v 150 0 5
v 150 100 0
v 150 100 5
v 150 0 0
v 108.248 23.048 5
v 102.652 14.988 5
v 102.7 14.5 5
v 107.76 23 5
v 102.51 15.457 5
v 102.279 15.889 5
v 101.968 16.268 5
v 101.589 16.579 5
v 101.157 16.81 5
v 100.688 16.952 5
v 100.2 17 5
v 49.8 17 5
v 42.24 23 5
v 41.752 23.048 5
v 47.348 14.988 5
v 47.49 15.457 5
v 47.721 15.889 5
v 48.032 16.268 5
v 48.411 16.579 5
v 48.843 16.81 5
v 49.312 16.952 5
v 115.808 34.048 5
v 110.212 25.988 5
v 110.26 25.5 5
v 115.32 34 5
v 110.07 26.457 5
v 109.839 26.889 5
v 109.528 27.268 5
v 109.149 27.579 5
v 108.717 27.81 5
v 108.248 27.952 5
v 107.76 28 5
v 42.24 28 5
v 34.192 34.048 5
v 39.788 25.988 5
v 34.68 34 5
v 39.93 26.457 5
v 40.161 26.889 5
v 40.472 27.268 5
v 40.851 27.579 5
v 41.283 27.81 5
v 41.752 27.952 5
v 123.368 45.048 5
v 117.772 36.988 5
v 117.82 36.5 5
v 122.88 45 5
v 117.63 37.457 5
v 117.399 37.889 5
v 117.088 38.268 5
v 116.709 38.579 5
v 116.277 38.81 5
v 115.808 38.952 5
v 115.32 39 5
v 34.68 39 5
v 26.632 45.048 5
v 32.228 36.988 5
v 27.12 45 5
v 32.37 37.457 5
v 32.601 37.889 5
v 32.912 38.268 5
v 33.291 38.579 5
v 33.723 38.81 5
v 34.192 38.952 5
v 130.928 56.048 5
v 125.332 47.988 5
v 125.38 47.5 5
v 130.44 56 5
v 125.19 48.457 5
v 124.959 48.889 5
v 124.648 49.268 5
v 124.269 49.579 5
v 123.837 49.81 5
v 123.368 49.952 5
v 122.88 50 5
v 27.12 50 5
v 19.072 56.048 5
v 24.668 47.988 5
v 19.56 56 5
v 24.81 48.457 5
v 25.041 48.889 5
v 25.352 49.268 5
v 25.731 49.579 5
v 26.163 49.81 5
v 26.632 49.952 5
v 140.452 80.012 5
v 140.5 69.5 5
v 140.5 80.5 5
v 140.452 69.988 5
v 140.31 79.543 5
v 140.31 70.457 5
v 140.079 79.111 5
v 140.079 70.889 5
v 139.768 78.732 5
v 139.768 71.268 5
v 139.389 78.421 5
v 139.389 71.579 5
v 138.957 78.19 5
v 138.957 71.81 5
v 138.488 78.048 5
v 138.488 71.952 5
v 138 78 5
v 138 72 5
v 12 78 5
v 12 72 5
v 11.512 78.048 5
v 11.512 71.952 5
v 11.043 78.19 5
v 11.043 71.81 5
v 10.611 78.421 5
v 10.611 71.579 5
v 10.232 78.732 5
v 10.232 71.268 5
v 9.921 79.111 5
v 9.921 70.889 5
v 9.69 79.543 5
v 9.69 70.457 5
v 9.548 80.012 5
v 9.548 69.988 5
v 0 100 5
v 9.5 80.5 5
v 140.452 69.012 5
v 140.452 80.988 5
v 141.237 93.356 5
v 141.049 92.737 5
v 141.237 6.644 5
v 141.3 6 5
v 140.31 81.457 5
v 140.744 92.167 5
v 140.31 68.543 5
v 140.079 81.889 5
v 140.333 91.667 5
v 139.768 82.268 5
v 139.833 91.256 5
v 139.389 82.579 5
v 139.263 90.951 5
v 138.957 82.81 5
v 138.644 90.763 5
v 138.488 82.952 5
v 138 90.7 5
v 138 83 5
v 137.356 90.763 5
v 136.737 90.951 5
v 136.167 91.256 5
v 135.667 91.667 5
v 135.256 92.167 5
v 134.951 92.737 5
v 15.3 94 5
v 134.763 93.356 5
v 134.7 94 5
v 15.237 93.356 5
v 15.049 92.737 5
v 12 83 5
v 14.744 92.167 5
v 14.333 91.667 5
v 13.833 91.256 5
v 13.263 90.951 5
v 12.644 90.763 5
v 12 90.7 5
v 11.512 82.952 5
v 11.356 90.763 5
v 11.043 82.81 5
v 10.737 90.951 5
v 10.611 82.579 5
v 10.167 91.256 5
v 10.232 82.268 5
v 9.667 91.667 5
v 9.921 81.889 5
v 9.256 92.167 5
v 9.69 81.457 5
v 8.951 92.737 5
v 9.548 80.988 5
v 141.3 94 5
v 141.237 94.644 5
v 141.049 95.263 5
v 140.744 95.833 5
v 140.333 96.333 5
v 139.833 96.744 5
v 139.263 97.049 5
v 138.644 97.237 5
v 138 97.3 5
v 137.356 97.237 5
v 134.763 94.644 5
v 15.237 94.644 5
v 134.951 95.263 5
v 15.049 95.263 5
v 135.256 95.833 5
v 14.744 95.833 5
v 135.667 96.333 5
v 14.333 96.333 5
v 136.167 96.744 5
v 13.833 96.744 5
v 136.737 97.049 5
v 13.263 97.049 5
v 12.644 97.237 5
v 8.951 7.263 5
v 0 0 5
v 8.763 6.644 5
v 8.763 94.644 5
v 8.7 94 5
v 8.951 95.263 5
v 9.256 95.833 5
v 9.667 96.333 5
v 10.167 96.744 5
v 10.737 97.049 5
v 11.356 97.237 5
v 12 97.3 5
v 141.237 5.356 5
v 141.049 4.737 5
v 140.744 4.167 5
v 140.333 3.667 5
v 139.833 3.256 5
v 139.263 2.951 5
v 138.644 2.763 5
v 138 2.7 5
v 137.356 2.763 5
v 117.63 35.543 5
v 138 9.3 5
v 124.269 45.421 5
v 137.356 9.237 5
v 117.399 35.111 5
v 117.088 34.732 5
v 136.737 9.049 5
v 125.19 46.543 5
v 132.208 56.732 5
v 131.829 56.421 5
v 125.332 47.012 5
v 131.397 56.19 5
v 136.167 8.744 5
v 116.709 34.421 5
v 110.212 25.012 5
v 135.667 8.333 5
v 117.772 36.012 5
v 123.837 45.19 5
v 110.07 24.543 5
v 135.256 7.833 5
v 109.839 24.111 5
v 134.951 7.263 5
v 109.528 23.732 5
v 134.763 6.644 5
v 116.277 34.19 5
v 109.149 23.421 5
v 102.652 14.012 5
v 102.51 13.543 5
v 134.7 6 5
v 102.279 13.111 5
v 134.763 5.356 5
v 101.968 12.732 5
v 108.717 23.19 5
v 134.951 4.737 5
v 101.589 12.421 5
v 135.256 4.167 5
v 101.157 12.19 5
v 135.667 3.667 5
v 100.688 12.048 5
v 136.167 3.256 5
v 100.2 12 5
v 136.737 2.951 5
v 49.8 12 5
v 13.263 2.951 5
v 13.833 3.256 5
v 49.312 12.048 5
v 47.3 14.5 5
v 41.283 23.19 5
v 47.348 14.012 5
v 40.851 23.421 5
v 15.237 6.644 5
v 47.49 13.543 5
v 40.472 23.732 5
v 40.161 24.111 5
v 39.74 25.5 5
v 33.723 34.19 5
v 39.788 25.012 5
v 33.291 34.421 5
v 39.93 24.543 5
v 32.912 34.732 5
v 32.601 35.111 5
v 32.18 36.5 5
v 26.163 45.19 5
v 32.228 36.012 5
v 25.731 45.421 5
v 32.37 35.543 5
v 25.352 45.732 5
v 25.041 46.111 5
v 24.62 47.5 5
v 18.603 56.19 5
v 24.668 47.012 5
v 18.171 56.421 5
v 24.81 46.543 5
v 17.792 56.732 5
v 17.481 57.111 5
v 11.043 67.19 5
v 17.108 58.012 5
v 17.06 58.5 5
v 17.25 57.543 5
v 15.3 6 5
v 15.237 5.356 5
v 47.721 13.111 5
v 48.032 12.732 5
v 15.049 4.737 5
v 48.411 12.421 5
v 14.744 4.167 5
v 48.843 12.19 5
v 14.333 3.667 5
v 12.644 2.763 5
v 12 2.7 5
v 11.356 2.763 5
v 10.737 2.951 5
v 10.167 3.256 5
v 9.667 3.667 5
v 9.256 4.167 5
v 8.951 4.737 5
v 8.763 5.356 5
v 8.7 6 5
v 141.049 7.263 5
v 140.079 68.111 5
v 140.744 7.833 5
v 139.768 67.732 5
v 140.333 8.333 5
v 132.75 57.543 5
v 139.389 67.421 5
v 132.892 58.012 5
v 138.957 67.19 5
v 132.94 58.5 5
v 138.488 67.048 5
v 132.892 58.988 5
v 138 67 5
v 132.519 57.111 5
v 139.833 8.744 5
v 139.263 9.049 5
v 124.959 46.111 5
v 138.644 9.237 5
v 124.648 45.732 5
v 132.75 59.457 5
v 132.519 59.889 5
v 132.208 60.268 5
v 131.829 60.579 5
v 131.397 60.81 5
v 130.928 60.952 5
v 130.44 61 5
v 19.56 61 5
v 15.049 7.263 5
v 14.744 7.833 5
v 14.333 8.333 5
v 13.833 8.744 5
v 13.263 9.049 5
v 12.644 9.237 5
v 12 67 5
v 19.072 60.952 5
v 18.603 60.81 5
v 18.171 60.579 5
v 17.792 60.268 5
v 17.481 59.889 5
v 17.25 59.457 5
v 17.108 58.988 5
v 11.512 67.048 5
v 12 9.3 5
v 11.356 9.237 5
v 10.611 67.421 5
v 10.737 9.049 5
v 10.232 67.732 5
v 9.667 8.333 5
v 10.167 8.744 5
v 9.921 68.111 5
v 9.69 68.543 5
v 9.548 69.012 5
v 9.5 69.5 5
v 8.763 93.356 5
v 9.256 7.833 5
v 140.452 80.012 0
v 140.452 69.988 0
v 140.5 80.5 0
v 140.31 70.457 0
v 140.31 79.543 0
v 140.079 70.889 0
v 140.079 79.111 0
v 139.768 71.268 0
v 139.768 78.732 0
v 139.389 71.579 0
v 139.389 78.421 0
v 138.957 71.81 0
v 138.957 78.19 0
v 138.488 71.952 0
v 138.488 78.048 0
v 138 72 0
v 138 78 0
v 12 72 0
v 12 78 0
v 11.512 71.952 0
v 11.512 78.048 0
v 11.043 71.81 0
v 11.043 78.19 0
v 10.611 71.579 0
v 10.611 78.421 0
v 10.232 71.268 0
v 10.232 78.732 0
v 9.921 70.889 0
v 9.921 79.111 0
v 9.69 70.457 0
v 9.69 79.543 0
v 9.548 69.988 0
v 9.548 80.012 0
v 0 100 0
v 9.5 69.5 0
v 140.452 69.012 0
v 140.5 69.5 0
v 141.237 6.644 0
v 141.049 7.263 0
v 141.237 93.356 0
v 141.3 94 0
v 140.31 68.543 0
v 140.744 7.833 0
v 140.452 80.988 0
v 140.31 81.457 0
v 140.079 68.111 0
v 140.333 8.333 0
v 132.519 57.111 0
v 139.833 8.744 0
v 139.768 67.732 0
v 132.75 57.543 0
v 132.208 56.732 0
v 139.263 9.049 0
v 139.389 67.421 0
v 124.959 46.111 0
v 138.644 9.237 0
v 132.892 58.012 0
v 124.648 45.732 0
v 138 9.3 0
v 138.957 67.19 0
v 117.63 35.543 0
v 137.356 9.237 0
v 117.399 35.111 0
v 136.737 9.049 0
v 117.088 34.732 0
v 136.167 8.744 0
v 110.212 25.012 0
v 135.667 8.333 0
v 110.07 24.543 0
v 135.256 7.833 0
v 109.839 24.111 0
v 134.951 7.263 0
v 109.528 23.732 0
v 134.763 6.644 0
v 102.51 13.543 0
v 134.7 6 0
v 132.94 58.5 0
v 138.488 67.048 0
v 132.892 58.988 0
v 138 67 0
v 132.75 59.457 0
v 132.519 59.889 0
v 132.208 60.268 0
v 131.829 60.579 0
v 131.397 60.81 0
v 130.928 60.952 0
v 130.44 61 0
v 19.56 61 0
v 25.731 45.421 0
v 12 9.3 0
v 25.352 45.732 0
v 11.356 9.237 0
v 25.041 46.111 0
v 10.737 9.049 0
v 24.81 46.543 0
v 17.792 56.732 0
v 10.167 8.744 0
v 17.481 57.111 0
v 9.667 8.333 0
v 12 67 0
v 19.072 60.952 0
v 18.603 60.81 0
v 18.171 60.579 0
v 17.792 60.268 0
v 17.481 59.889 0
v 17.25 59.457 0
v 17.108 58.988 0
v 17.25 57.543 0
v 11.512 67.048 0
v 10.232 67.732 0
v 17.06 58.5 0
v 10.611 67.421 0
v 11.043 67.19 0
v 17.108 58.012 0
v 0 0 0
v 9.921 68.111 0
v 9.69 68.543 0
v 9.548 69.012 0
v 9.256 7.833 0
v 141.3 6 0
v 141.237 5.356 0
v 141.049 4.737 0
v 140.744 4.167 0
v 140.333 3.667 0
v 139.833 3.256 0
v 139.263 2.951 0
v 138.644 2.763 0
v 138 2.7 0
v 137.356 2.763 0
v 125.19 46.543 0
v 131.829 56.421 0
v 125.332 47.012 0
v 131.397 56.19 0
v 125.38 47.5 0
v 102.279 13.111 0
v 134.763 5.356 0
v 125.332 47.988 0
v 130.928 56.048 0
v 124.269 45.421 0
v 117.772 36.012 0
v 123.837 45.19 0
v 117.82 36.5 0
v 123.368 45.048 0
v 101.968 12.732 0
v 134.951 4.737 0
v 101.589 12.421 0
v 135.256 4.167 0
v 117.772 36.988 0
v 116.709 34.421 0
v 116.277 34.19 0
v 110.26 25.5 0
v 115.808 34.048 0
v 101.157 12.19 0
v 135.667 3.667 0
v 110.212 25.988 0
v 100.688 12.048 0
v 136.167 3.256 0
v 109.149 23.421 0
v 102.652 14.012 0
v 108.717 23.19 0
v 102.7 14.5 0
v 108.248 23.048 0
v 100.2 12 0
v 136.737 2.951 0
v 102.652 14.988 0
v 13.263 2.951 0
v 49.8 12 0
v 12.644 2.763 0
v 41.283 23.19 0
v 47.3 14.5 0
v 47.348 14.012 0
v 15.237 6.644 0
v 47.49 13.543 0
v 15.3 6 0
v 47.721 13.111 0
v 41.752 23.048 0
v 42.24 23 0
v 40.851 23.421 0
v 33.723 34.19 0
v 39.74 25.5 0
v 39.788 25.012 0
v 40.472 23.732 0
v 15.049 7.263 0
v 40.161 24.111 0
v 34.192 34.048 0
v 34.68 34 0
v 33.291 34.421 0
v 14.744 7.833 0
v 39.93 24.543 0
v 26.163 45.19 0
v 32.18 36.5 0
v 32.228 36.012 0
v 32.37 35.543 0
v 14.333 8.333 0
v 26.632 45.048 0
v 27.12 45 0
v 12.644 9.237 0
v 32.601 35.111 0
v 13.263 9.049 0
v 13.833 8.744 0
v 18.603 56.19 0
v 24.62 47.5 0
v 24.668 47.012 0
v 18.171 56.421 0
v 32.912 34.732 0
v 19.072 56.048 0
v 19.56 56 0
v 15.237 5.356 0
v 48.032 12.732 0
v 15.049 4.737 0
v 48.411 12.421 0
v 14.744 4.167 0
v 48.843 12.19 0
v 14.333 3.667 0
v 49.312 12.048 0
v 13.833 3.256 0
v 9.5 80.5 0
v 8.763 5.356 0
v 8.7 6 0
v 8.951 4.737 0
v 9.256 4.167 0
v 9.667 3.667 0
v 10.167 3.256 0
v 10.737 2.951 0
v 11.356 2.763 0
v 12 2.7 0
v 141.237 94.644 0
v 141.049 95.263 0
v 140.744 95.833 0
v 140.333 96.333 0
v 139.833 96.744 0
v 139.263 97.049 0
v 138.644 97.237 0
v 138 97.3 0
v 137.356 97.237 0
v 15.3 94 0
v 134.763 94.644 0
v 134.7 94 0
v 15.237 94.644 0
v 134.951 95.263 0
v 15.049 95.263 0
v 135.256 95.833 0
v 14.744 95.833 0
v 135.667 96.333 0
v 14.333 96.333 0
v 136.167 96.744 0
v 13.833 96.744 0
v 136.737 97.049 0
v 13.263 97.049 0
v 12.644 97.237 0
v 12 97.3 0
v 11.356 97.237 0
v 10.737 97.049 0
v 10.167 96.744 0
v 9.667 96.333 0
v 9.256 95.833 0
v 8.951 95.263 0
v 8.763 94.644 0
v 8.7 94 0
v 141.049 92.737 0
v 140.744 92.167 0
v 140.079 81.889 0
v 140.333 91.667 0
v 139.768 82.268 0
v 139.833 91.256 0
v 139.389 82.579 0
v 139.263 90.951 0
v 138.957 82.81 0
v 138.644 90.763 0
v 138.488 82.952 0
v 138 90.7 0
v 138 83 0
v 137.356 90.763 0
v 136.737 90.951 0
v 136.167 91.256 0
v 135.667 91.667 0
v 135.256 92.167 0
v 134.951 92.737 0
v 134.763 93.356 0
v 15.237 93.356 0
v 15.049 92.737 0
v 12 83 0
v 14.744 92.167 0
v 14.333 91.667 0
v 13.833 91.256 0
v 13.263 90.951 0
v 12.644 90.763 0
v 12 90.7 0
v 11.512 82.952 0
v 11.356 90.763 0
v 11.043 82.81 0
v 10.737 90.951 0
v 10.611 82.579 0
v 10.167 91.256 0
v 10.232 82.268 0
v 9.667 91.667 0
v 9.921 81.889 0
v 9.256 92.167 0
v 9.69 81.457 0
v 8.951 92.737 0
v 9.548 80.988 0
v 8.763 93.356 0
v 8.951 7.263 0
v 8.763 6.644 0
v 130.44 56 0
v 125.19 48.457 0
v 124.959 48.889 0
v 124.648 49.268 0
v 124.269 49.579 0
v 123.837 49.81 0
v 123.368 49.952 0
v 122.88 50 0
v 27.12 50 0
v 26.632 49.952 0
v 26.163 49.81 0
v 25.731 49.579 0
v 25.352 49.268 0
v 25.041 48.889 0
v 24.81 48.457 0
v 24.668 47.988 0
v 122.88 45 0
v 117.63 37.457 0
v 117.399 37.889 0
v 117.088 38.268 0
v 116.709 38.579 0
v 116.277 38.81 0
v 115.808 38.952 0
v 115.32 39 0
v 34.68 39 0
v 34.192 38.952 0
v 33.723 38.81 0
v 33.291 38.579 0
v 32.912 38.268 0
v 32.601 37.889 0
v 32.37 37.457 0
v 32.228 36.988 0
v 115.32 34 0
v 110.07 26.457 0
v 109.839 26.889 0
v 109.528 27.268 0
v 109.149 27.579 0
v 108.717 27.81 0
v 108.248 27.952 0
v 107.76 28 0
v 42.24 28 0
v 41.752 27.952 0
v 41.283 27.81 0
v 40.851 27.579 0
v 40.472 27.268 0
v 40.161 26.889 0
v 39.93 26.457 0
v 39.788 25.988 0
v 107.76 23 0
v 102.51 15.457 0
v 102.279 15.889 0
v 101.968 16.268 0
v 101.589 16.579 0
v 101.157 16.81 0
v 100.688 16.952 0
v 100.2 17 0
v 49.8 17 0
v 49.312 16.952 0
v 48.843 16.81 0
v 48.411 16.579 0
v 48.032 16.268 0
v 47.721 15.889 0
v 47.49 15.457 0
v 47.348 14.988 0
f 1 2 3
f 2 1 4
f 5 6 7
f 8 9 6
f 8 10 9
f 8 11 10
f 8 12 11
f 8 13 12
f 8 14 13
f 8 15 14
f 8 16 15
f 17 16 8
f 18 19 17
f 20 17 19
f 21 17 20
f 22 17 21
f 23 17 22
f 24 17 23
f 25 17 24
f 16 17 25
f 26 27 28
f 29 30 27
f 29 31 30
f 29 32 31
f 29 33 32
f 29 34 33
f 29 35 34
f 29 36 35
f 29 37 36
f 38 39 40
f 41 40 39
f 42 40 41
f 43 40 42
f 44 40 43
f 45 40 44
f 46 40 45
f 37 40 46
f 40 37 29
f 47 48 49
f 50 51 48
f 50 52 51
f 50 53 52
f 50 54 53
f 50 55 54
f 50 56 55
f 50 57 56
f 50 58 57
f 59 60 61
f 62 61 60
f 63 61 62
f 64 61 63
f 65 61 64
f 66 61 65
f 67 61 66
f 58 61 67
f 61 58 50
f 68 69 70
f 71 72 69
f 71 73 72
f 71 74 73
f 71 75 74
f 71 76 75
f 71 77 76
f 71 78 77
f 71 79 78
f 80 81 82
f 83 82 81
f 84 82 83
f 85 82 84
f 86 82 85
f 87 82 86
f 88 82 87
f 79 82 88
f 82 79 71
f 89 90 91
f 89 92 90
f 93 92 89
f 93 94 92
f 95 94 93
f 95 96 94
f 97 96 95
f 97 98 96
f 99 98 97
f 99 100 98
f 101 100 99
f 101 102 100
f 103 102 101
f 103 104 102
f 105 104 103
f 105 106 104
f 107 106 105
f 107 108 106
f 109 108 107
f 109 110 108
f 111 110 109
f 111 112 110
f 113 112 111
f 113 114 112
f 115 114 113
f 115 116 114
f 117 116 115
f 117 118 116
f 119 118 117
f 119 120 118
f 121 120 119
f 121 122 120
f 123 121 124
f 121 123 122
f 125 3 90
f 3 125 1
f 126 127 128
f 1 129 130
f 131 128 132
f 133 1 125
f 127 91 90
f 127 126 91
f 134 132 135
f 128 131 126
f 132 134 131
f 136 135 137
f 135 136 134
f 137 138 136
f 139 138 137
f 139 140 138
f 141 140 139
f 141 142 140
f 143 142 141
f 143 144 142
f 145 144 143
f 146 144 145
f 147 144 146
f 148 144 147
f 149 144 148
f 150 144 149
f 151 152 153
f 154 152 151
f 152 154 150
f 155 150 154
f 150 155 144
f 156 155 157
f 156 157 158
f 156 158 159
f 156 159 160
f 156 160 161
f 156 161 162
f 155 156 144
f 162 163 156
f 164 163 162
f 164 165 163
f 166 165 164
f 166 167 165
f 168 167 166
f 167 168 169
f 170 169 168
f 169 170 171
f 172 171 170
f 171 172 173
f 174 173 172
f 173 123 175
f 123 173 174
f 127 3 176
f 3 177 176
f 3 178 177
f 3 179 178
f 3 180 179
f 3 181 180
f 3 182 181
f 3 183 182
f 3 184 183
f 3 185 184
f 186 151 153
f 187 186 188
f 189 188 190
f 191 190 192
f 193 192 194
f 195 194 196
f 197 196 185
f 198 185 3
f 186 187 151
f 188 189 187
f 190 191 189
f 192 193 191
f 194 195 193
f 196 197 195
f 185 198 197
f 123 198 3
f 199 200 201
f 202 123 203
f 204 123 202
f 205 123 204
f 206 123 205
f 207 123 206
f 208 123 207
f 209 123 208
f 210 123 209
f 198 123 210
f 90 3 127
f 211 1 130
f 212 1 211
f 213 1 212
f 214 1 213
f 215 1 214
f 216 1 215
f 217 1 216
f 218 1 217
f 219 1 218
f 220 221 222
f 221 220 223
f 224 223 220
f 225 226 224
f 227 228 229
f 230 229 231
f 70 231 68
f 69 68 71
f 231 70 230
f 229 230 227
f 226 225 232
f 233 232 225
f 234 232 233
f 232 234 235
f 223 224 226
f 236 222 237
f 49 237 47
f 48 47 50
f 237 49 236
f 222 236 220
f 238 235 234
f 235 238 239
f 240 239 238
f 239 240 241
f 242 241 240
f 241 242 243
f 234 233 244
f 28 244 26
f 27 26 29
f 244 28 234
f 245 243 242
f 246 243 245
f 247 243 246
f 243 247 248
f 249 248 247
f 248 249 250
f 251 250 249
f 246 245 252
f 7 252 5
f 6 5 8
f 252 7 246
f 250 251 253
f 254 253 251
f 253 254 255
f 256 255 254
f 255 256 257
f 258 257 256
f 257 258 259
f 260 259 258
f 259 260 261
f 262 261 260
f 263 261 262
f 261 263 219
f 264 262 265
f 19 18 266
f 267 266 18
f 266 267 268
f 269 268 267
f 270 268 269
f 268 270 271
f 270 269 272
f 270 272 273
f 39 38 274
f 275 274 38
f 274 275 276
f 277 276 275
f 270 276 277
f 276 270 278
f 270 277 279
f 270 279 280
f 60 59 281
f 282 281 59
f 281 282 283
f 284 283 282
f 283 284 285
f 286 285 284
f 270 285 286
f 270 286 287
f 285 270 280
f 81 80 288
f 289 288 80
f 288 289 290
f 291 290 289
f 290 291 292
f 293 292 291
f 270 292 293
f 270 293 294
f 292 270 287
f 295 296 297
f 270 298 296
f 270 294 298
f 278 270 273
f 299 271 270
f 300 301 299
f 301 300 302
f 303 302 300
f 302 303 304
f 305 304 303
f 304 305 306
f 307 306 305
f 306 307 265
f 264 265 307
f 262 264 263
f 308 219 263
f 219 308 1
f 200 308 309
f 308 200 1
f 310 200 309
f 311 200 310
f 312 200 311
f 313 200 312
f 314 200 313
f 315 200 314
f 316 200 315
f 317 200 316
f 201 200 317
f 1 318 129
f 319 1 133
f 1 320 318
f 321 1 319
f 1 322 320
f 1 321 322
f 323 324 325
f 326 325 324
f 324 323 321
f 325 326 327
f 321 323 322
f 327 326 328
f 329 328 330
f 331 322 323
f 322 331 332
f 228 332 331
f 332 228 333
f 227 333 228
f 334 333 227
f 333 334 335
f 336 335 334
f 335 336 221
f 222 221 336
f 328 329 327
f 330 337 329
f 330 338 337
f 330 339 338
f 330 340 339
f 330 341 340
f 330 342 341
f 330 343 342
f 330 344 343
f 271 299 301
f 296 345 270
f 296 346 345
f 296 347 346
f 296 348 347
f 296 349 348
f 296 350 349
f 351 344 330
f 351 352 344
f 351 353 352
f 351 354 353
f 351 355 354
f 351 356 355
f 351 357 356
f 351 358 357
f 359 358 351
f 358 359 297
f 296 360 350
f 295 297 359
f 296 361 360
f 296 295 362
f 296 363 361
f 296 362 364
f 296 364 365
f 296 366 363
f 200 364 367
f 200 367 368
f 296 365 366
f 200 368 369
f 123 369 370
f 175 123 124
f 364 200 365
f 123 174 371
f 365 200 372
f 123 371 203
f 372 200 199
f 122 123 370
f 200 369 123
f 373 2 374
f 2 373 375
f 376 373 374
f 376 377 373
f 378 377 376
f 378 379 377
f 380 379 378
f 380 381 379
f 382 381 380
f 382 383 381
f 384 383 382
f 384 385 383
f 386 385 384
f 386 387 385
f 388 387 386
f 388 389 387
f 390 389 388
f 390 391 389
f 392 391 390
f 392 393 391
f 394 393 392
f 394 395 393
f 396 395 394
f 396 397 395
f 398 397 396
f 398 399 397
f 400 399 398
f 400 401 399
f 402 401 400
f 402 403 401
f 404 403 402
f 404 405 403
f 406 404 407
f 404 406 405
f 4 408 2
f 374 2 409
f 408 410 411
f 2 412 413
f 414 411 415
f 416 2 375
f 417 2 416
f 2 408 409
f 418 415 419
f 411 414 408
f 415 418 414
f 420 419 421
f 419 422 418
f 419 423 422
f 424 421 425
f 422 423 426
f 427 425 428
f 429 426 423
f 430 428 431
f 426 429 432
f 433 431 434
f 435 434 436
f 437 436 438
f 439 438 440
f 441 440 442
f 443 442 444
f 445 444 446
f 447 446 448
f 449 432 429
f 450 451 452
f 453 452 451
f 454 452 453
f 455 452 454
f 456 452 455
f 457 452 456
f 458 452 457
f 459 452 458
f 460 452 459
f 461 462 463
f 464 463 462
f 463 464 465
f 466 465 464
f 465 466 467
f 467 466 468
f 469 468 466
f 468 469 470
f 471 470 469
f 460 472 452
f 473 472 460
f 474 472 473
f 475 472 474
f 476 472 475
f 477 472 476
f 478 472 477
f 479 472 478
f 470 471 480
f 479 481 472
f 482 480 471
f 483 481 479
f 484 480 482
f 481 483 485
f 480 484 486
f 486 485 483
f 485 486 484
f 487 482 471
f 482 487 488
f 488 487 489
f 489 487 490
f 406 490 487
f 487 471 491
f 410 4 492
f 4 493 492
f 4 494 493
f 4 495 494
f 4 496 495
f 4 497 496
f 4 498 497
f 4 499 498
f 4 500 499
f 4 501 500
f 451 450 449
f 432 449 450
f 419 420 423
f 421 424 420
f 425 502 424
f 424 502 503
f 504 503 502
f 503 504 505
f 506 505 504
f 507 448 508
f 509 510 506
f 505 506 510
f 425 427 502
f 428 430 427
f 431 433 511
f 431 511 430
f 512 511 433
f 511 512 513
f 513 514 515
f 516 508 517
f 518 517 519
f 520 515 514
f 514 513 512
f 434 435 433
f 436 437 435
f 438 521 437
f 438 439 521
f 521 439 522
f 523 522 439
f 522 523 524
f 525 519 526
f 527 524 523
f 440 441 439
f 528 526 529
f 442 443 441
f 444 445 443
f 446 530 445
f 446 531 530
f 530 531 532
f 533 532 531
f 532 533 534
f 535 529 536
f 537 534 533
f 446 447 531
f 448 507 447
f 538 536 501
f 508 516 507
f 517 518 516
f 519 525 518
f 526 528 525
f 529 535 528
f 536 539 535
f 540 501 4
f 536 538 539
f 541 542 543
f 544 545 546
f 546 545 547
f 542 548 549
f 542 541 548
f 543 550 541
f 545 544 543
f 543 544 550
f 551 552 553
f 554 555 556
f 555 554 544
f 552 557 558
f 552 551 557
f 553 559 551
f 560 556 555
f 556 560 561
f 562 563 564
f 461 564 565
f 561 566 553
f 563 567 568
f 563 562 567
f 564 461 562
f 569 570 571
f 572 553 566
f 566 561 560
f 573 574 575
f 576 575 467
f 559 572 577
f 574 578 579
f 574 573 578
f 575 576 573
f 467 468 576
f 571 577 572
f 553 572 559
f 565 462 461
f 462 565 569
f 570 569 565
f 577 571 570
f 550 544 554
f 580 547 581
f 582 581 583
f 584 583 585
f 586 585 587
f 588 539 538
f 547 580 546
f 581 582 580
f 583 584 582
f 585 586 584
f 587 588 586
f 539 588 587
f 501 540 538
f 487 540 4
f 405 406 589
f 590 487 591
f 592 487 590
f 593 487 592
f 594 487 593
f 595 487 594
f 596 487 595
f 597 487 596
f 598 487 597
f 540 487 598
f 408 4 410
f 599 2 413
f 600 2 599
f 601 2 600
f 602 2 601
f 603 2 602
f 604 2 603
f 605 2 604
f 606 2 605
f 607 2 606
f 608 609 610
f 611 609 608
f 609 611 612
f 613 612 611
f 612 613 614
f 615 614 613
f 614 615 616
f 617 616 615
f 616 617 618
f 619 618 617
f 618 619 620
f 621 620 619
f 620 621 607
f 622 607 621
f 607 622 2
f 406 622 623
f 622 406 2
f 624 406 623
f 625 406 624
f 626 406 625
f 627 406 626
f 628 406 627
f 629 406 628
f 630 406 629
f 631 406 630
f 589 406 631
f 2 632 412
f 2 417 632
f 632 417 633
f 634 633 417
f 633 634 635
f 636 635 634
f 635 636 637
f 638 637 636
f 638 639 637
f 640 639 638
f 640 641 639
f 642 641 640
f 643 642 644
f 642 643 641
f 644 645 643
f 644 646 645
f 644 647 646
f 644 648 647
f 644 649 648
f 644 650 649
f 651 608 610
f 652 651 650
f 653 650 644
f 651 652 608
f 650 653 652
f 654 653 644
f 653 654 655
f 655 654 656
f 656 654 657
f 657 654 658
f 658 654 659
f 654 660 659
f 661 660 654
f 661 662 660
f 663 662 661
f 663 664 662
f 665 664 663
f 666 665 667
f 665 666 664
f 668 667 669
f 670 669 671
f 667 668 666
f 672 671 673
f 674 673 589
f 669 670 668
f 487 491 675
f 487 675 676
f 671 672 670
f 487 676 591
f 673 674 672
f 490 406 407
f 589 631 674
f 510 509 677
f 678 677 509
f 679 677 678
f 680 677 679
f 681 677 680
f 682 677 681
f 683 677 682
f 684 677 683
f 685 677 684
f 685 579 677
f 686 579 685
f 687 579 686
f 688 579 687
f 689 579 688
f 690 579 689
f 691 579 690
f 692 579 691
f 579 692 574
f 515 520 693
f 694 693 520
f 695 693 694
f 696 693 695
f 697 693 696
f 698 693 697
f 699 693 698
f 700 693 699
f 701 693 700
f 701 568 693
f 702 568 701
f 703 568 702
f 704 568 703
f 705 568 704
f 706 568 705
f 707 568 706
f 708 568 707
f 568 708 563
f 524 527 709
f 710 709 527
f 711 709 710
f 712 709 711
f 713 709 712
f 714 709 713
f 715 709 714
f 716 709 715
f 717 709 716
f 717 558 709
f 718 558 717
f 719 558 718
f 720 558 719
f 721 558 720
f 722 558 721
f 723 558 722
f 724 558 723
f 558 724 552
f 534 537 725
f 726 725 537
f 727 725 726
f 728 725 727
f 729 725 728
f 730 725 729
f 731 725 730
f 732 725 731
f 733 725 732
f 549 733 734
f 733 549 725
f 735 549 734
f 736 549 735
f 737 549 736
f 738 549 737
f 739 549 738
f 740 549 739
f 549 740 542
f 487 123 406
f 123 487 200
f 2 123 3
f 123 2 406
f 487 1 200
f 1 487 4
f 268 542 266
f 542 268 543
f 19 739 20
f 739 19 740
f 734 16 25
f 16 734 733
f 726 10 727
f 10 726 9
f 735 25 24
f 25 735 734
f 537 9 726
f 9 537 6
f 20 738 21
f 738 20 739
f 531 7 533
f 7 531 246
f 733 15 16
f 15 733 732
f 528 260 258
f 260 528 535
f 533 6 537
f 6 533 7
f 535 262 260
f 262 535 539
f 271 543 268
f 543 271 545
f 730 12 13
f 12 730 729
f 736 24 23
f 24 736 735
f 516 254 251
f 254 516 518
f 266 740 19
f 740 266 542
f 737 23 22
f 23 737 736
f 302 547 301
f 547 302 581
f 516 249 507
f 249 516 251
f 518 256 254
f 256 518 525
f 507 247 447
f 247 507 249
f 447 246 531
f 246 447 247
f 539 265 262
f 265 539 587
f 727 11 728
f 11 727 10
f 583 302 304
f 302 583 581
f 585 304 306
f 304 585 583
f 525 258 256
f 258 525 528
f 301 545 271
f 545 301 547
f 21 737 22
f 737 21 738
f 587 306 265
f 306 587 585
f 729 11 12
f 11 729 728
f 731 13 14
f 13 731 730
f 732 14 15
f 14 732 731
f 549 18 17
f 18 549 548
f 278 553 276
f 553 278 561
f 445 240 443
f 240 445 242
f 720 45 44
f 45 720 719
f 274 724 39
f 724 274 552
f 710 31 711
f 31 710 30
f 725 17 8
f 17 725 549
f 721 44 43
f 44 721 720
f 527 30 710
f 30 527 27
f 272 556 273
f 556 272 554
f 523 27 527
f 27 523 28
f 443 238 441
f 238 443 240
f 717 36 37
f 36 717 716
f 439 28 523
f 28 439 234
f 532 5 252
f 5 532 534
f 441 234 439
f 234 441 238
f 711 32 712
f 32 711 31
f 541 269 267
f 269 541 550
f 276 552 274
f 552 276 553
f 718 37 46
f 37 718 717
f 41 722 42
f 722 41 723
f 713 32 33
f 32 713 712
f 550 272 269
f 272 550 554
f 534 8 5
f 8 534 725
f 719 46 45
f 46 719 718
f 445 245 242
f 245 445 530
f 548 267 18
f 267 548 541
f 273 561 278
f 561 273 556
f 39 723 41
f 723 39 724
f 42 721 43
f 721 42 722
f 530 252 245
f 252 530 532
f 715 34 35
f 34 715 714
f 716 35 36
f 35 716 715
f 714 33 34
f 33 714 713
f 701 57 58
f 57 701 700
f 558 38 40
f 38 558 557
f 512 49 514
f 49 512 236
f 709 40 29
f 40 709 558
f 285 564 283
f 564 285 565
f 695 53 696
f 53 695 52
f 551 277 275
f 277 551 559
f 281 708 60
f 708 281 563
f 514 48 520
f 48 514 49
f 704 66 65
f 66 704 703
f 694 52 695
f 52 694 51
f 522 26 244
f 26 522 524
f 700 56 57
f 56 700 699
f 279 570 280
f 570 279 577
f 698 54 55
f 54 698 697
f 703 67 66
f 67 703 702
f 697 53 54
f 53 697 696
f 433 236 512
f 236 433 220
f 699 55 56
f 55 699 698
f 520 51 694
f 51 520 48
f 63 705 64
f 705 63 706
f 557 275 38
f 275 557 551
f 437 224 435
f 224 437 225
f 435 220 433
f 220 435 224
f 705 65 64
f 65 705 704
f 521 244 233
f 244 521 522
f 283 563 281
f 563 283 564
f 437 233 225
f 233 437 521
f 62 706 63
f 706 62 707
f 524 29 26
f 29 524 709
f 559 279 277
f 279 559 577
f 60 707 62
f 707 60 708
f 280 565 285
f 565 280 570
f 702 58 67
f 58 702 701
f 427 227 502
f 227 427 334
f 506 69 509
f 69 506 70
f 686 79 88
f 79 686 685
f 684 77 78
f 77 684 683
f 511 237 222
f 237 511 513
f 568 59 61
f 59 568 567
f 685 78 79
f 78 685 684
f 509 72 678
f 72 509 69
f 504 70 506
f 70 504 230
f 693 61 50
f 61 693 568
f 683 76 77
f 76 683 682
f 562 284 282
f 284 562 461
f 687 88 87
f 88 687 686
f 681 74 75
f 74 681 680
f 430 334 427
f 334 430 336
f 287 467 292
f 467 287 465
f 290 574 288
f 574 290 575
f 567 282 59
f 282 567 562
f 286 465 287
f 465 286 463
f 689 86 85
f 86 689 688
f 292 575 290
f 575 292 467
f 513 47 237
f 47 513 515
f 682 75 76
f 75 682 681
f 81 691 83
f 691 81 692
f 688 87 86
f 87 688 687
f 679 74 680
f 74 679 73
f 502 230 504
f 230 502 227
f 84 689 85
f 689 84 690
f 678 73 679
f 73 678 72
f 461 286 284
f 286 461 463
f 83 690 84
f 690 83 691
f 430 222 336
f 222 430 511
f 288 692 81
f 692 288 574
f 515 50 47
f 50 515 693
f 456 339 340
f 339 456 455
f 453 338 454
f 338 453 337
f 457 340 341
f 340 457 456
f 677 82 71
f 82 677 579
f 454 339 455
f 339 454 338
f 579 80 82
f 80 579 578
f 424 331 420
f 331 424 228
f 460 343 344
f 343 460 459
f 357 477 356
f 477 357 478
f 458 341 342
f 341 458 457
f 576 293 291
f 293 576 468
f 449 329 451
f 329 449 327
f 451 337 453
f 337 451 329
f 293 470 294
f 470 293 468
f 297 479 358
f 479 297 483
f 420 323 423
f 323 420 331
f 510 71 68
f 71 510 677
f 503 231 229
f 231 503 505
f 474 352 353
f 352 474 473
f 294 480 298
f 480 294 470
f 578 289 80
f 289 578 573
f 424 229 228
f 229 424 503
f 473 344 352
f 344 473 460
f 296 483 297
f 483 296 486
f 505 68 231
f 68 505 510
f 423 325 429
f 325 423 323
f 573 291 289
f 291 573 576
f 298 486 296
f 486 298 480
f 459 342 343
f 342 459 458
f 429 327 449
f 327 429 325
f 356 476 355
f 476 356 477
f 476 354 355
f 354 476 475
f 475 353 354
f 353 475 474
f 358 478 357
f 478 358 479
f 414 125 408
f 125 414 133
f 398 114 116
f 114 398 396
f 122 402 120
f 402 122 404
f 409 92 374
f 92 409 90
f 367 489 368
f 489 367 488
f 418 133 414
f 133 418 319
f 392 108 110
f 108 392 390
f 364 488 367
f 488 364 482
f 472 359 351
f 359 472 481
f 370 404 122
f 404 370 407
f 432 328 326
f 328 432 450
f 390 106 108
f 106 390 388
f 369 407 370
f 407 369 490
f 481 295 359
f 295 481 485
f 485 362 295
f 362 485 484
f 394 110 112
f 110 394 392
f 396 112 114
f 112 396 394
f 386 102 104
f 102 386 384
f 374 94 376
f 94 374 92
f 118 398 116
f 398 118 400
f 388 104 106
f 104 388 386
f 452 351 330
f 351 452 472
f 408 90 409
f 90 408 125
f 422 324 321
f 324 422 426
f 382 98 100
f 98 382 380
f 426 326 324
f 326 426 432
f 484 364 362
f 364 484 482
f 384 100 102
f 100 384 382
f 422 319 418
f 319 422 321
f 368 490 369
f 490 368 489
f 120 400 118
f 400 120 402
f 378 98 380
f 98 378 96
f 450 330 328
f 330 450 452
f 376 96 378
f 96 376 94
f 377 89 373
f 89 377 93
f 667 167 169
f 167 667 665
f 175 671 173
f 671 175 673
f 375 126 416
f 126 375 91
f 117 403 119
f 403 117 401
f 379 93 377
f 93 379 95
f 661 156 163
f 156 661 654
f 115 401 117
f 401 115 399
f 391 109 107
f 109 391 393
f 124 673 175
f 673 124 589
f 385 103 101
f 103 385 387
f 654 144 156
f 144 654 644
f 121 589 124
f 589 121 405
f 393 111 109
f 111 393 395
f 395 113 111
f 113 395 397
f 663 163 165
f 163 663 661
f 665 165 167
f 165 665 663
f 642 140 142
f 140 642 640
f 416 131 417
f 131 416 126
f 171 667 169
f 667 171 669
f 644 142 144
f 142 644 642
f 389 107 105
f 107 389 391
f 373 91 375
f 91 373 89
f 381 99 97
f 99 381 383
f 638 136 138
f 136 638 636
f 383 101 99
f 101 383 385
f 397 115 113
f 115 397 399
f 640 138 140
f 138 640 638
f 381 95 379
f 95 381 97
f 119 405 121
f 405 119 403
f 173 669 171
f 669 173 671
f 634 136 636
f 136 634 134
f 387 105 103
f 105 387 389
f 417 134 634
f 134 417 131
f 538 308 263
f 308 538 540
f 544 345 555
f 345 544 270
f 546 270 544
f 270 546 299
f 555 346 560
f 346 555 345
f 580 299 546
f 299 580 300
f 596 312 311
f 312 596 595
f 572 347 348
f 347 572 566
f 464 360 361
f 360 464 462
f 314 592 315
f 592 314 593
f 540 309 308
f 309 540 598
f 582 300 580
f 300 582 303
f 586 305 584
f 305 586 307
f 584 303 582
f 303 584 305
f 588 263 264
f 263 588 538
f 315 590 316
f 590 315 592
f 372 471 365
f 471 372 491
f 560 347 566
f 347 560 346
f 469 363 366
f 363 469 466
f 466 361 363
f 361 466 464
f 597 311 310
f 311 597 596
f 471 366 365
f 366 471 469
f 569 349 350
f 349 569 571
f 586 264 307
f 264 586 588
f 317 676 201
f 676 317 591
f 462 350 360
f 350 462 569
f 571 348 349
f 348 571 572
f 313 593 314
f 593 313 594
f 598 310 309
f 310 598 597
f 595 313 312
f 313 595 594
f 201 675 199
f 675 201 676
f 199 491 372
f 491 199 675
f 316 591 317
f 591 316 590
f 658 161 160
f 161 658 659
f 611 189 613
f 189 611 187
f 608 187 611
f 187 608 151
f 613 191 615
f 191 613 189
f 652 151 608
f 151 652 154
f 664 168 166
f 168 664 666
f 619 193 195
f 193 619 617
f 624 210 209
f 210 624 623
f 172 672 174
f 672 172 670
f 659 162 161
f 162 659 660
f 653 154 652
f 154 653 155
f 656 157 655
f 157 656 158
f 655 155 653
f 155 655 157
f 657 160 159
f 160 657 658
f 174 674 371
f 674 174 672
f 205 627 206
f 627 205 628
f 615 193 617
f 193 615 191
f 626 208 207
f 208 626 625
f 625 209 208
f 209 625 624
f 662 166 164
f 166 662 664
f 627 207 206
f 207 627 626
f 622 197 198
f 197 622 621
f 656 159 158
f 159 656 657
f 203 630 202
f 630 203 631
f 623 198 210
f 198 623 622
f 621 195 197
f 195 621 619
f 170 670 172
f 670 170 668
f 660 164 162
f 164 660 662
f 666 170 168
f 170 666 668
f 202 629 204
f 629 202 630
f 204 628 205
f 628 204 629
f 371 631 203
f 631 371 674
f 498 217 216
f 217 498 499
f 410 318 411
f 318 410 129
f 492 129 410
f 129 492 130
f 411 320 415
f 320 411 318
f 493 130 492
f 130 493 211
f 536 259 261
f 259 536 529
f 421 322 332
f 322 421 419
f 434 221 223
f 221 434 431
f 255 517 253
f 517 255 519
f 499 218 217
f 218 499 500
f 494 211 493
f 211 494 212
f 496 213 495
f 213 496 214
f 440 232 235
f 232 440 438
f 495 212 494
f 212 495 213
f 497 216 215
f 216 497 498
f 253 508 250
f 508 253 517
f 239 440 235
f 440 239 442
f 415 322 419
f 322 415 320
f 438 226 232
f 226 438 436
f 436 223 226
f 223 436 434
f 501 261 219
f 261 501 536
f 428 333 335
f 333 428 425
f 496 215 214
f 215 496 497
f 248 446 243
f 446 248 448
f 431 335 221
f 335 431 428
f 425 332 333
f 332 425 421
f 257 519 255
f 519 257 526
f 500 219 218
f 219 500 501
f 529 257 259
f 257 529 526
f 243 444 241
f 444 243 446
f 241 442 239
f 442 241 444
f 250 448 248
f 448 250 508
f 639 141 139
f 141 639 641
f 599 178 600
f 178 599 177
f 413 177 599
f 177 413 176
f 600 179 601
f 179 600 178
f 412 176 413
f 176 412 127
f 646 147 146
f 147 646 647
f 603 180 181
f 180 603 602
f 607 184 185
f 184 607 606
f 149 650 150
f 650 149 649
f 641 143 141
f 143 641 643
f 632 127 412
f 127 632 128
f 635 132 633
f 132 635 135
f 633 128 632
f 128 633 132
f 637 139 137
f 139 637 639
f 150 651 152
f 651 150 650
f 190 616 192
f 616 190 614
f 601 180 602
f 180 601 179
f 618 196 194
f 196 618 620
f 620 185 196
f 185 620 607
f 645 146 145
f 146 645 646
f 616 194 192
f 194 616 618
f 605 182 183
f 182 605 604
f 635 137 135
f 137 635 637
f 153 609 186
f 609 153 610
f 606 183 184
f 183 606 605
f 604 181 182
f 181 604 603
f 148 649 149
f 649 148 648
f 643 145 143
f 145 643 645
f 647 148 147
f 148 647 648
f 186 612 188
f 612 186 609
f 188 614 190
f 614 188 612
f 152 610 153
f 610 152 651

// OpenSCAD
$fn = 32;
// ----------------------------------------------------------------------
// Slotted panel: 150 x 100 mm, 7 рядов of slots
// ----------------------------------------------------------------------

// --- parameters (mm) ---
panel_w = 150;            // panel width
panel_d = 100;            // panel depth
thick = 5;                // panel thickness
slot_w = 5;               // slot width
pitch0 = 11;              // first row pitch
pitch_step = 1.2;         // pitch increase per row
margin = 12;              // margin around the slot field
rows = 7;                 // number of slot rows
mount_d = 6.6;            // mounting holes
mount_x = 63;             // mounting hole offset

difference() {
  union() {
    cube([panel_w, panel_d, thick]);
  }
  /* slot rows: stadium shaped cutters, 2.5 mm clear of both faces */
  /* row 0: pitch 11, length 50.4 */
  hull() {
    translate([49.8, 14.5, -2.5]) cylinder(h = thick + 5, d = slot_w);
    translate([100.2, 14.5, -2.5]) cylinder(h = thick + 5, d = slot_w);
  }
  /* row 1: pitch 11, length 65.52 */
  hull() {
    translate([42.24, 25.5, -2.5]) cylinder(h = thick + 5, d = slot_w);
    translate([107.76, 25.5, -2.5]) cylinder(h = thick + 5, d = slot_w);
  }
  /* row 2: pitch 11, length 80.64 */
  hull() {
    translate([34.68, 36.5, -2.5]) cylinder(h = thick + 5, d = slot_w);
    translate([115.32, 36.5, -2.5]) cylinder(h = thick + 5, d = slot_w);
  }
  /* row 3: pitch 11, length 95.76 */
  hull() {
    translate([27.12, 47.5, -2.5]) cylinder(h = thick + 5, d = slot_w);
    translate([122.88, 47.5, -2.5]) cylinder(h = thick + 5, d = slot_w);
  }
  /* row 4: pitch 11, length 110.88 */
  hull() {
    translate([19.56, 58.5, -2.5]) cylinder(h = thick + 5, d = slot_w);
    translate([130.44, 58.5, -2.5]) cylinder(h = thick + 5, d = slot_w);
  }
  /* row 5: pitch 11, length 126 */
  hull() {
    translate([12, 69.5, -2.5]) cylinder(h = thick + 5, d = slot_w);
    translate([138, 69.5, -2.5]) cylinder(h = thick + 5, d = slot_w);
  }
  /* row 6: pitch 11, length 126 */
  hull() {
    translate([12, 80.5, -2.5]) cylinder(h = thick + 5, d = slot_w);
    translate([138, 80.5, -2.5]) cylinder(h = thick + 5, d = slot_w);
  }
  translate([12, 6, -2.5]) cylinder(h = 10, d = mount_d);
  translate([12, 94, -2.5]) cylinder(h = 10, d = mount_d);
  translate([138, 6, -2.5]) cylinder(h = 10, d = mount_d);
  translate([138, 94, -2.5]) cylinder(h = 10, d = mount_d);
}
